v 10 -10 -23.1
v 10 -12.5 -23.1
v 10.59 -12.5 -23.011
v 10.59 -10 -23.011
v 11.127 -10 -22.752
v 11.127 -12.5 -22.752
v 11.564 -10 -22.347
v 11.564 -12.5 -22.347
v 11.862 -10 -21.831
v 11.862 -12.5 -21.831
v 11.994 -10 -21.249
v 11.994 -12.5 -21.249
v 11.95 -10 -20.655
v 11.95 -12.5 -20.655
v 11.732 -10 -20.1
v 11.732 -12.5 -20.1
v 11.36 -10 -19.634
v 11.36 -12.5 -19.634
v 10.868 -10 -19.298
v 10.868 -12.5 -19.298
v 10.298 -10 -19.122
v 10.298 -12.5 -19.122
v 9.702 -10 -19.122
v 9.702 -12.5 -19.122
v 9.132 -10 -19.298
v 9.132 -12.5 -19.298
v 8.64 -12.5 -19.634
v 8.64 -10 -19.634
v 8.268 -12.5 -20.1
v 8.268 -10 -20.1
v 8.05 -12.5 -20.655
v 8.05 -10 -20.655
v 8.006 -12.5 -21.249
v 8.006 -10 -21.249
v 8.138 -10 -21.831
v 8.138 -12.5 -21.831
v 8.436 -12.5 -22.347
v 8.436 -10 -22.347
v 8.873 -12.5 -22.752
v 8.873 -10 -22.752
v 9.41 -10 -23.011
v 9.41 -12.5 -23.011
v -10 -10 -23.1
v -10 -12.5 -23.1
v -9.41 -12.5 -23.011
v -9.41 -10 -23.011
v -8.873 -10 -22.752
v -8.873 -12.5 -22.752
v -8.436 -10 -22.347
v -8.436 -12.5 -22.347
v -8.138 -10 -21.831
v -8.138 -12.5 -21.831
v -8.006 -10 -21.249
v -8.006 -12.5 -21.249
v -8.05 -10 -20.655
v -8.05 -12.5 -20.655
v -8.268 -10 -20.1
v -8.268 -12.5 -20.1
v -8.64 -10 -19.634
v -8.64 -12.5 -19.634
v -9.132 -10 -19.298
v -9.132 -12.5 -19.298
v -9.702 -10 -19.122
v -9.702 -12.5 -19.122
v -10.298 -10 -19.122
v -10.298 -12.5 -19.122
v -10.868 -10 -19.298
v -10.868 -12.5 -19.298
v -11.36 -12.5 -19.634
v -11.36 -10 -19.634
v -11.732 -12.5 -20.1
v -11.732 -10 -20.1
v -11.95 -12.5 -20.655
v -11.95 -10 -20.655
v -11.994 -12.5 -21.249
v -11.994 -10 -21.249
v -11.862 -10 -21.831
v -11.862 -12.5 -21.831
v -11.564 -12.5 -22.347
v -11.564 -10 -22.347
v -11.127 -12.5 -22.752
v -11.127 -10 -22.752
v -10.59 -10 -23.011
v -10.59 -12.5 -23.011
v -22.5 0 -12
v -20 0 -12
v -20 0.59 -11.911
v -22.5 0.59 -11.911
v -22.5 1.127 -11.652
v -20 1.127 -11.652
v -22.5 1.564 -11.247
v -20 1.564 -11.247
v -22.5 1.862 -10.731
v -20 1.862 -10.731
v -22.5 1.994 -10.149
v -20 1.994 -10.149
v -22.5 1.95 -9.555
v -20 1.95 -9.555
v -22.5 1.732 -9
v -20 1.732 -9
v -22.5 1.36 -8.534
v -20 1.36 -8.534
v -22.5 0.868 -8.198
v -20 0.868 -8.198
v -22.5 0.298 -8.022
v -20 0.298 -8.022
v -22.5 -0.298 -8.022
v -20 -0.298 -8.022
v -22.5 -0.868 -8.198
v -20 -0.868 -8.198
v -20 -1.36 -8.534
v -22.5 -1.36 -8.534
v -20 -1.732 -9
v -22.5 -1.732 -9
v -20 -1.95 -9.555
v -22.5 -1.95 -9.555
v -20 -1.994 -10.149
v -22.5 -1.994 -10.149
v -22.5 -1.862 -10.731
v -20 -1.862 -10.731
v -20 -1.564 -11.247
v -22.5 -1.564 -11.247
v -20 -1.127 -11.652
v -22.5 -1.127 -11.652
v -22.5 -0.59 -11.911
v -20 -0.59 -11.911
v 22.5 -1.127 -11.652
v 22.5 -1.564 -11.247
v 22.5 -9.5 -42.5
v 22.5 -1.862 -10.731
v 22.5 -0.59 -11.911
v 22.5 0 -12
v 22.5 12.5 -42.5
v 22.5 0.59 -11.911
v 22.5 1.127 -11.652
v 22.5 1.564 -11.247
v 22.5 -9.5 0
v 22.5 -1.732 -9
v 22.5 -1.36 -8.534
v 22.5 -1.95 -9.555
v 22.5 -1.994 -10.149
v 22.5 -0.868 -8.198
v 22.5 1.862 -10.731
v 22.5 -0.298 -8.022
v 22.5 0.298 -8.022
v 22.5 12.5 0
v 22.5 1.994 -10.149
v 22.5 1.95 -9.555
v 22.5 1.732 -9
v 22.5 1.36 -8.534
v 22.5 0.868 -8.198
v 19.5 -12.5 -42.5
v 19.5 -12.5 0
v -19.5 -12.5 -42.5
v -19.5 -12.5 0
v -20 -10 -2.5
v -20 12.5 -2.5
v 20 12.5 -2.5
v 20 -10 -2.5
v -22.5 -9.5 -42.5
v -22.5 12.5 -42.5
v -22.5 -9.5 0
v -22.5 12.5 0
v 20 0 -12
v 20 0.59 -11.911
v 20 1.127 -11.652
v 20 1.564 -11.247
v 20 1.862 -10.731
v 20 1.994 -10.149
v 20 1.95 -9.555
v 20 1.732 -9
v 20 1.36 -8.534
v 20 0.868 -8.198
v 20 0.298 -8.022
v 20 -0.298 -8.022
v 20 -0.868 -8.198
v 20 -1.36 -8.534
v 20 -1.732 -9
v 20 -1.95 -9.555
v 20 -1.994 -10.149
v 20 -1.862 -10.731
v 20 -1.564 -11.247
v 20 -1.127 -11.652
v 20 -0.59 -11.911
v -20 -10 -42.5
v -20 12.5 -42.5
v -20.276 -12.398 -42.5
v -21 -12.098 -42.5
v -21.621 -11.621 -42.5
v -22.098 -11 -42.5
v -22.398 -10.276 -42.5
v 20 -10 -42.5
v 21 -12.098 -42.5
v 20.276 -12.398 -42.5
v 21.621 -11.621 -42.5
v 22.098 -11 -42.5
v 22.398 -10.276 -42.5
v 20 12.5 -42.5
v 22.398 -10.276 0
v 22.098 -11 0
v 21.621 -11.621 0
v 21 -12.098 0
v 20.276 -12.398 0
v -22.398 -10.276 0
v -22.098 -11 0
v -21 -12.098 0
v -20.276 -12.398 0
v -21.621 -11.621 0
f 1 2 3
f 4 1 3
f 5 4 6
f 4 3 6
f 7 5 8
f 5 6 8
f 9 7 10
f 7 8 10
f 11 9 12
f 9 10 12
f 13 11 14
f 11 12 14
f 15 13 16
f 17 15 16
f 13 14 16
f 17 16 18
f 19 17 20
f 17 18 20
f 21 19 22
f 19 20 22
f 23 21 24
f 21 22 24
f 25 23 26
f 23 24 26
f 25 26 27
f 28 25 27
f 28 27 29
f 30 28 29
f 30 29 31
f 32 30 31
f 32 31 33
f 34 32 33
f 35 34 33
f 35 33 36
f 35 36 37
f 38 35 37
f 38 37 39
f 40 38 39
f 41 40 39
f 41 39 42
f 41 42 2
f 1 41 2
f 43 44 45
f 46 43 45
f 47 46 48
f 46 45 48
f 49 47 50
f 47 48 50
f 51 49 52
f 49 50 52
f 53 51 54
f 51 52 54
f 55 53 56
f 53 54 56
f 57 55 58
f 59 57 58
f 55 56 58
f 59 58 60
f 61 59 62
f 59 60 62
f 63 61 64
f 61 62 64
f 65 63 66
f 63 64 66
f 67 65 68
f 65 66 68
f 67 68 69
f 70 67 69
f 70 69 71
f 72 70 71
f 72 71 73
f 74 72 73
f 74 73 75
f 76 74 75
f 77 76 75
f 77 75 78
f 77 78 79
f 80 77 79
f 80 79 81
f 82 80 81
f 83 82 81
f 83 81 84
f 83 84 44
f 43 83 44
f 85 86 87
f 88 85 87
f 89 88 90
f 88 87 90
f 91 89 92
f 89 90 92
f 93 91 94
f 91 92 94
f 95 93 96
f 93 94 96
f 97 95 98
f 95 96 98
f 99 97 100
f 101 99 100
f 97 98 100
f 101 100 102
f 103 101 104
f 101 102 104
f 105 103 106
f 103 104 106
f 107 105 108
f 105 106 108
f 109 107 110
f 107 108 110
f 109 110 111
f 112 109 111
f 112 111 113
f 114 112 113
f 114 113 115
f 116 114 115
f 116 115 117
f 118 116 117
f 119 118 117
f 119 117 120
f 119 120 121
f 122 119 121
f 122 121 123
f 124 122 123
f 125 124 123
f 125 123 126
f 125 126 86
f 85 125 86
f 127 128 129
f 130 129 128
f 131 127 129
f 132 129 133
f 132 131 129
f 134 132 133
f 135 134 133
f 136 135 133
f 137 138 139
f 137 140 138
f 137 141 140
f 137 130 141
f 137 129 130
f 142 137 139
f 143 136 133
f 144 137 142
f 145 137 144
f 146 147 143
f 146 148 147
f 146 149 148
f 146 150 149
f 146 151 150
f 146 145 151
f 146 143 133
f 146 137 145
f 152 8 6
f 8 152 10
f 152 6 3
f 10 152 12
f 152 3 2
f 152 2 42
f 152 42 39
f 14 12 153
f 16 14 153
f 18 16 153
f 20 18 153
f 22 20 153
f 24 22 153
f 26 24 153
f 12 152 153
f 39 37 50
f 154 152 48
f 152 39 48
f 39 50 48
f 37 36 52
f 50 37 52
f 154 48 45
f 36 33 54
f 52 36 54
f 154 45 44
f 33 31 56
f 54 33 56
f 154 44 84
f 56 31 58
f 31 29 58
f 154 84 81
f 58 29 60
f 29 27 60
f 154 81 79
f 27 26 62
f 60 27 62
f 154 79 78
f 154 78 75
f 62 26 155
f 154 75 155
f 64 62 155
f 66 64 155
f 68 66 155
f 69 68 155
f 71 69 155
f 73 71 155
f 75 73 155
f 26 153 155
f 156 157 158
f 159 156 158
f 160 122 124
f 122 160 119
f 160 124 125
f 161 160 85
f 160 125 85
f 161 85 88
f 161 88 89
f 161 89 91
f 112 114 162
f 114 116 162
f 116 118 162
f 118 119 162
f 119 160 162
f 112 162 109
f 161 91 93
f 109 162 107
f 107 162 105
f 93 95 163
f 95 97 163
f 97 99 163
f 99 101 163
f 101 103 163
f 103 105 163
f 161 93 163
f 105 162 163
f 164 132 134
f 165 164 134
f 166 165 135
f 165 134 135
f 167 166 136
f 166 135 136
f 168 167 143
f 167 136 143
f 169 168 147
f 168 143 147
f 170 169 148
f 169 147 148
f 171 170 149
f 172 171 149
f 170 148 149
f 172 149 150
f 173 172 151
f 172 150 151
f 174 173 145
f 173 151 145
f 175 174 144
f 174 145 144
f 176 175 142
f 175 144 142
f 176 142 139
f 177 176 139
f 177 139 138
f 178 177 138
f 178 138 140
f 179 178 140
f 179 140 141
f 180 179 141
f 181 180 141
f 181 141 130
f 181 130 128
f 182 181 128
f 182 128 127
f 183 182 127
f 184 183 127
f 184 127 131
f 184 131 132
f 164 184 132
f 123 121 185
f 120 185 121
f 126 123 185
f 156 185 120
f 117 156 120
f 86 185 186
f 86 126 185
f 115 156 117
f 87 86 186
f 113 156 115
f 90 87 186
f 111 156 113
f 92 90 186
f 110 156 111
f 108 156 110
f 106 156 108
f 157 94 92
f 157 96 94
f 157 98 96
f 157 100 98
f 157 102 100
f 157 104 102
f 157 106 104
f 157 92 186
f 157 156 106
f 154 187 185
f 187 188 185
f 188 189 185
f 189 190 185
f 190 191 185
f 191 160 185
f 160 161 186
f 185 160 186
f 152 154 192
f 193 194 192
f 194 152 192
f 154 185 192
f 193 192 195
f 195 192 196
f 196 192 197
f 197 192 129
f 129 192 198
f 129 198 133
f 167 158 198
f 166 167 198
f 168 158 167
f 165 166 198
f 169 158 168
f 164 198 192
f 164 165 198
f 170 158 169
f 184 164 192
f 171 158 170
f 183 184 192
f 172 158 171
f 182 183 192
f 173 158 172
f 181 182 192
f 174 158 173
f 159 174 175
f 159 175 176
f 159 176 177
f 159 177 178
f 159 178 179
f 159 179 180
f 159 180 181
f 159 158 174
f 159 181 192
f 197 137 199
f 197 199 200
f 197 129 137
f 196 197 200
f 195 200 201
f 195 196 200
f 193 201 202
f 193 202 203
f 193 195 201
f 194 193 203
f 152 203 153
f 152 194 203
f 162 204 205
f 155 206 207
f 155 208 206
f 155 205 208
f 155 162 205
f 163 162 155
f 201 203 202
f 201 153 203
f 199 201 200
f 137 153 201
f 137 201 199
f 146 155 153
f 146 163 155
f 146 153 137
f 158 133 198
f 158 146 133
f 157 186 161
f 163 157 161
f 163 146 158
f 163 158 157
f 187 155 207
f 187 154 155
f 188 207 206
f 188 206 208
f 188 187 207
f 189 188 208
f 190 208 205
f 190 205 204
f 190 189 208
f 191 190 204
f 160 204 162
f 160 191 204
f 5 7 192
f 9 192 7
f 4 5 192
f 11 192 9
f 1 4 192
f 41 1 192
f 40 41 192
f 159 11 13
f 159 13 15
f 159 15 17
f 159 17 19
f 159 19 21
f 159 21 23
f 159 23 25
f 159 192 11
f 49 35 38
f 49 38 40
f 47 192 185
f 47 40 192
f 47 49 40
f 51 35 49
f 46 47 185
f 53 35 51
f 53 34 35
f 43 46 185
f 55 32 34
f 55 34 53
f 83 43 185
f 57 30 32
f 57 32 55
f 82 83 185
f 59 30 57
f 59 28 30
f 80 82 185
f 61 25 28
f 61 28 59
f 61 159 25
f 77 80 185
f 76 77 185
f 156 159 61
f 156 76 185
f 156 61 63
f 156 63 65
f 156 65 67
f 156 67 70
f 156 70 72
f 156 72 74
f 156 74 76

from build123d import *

# Parameters (mm, degrees)
CROQUIS1_W              = 45
CROQUIS1_H              = 25
SALIENTE_EXTRUIR1_DEPTH = 2.5
SALIENTE_EXTRUIR2_DEPTH = 40
REDONDEO2_R             = 3
REDONDEO3_R             = 3
CROQUIS3_R              = 2
CORTAR_EXTRUIR1_DEPTH   = 100
CROQUIS4_R              = 2
CORTAR_EXTRUIR2_DEPTH   = 40


with BuildPart() as part:
    # Croquis1 → Saliente-Extruir1 (new body)
    with BuildSketch(Plane.XY):
        Rectangle(CROQUIS1_W, CROQUIS1_H)
    extrude(amount=-SALIENTE_EXTRUIR1_DEPTH)

    # Croquis2 → Saliente-Extruir2 (add)
    with BuildSketch(Plane(origin=(0, 0, -2.5), x_dir=(-1, 0, 0), z_dir=(0, 0, -1))):
        Polygon((-22.5, 12.5), (-20, 12.5), (-20, -10), (20, -10), (20, 12.5), (22.5, 12.5), (22.5, -12.5), (20, -12.5), (-20, -12.5), (-22.5, -12.5), align=None)
    extrude(amount=SALIENTE_EXTRUIR2_DEPTH)

    # Redondeo2
    redondeo2_edges = [part.edges().sort_by_distance(p)[0] for p in [
        (22.5, -12.5, -21.25),
    ]]
    fillet(redondeo2_edges, radius=REDONDEO2_R)

    # Redondeo3
    redondeo3_edges = [part.edges().sort_by_distance(p)[0] for p in [
        (-22.5, -12.5, -21.25),
    ]]
    fillet(redondeo3_edges, radius=REDONDEO3_R)

    # Croquis3 → Cortar-Extruir1 (cut)
    with BuildSketch(Plane(origin=(22.5, 0, 0), x_dir=(0, 0, -1), z_dir=(1, 0, 0))):
        with Locations((10, 0)):
            Circle(CROQUIS3_R)
    extrude(amount=-CORTAR_EXTRUIR1_DEPTH, mode=Mode.SUBTRACT)

    # Croquis4 → Cortar-Extruir2 (cut)
    with BuildSketch(Plane.XZ.offset(12.5)):
        with Locations(Location((-10, -21.1, 0), (0, 0, 270))):
            Circle(CROQUIS4_R)
        with Locations(Location((10, -21.1, 0), (0, 0, 270))):
            Circle(CROQUIS4_R)
    extrude(amount=-CORTAR_EXTRUIR2_DEPTH, mode=Mode.SUBTRACT)


solid = part.part
